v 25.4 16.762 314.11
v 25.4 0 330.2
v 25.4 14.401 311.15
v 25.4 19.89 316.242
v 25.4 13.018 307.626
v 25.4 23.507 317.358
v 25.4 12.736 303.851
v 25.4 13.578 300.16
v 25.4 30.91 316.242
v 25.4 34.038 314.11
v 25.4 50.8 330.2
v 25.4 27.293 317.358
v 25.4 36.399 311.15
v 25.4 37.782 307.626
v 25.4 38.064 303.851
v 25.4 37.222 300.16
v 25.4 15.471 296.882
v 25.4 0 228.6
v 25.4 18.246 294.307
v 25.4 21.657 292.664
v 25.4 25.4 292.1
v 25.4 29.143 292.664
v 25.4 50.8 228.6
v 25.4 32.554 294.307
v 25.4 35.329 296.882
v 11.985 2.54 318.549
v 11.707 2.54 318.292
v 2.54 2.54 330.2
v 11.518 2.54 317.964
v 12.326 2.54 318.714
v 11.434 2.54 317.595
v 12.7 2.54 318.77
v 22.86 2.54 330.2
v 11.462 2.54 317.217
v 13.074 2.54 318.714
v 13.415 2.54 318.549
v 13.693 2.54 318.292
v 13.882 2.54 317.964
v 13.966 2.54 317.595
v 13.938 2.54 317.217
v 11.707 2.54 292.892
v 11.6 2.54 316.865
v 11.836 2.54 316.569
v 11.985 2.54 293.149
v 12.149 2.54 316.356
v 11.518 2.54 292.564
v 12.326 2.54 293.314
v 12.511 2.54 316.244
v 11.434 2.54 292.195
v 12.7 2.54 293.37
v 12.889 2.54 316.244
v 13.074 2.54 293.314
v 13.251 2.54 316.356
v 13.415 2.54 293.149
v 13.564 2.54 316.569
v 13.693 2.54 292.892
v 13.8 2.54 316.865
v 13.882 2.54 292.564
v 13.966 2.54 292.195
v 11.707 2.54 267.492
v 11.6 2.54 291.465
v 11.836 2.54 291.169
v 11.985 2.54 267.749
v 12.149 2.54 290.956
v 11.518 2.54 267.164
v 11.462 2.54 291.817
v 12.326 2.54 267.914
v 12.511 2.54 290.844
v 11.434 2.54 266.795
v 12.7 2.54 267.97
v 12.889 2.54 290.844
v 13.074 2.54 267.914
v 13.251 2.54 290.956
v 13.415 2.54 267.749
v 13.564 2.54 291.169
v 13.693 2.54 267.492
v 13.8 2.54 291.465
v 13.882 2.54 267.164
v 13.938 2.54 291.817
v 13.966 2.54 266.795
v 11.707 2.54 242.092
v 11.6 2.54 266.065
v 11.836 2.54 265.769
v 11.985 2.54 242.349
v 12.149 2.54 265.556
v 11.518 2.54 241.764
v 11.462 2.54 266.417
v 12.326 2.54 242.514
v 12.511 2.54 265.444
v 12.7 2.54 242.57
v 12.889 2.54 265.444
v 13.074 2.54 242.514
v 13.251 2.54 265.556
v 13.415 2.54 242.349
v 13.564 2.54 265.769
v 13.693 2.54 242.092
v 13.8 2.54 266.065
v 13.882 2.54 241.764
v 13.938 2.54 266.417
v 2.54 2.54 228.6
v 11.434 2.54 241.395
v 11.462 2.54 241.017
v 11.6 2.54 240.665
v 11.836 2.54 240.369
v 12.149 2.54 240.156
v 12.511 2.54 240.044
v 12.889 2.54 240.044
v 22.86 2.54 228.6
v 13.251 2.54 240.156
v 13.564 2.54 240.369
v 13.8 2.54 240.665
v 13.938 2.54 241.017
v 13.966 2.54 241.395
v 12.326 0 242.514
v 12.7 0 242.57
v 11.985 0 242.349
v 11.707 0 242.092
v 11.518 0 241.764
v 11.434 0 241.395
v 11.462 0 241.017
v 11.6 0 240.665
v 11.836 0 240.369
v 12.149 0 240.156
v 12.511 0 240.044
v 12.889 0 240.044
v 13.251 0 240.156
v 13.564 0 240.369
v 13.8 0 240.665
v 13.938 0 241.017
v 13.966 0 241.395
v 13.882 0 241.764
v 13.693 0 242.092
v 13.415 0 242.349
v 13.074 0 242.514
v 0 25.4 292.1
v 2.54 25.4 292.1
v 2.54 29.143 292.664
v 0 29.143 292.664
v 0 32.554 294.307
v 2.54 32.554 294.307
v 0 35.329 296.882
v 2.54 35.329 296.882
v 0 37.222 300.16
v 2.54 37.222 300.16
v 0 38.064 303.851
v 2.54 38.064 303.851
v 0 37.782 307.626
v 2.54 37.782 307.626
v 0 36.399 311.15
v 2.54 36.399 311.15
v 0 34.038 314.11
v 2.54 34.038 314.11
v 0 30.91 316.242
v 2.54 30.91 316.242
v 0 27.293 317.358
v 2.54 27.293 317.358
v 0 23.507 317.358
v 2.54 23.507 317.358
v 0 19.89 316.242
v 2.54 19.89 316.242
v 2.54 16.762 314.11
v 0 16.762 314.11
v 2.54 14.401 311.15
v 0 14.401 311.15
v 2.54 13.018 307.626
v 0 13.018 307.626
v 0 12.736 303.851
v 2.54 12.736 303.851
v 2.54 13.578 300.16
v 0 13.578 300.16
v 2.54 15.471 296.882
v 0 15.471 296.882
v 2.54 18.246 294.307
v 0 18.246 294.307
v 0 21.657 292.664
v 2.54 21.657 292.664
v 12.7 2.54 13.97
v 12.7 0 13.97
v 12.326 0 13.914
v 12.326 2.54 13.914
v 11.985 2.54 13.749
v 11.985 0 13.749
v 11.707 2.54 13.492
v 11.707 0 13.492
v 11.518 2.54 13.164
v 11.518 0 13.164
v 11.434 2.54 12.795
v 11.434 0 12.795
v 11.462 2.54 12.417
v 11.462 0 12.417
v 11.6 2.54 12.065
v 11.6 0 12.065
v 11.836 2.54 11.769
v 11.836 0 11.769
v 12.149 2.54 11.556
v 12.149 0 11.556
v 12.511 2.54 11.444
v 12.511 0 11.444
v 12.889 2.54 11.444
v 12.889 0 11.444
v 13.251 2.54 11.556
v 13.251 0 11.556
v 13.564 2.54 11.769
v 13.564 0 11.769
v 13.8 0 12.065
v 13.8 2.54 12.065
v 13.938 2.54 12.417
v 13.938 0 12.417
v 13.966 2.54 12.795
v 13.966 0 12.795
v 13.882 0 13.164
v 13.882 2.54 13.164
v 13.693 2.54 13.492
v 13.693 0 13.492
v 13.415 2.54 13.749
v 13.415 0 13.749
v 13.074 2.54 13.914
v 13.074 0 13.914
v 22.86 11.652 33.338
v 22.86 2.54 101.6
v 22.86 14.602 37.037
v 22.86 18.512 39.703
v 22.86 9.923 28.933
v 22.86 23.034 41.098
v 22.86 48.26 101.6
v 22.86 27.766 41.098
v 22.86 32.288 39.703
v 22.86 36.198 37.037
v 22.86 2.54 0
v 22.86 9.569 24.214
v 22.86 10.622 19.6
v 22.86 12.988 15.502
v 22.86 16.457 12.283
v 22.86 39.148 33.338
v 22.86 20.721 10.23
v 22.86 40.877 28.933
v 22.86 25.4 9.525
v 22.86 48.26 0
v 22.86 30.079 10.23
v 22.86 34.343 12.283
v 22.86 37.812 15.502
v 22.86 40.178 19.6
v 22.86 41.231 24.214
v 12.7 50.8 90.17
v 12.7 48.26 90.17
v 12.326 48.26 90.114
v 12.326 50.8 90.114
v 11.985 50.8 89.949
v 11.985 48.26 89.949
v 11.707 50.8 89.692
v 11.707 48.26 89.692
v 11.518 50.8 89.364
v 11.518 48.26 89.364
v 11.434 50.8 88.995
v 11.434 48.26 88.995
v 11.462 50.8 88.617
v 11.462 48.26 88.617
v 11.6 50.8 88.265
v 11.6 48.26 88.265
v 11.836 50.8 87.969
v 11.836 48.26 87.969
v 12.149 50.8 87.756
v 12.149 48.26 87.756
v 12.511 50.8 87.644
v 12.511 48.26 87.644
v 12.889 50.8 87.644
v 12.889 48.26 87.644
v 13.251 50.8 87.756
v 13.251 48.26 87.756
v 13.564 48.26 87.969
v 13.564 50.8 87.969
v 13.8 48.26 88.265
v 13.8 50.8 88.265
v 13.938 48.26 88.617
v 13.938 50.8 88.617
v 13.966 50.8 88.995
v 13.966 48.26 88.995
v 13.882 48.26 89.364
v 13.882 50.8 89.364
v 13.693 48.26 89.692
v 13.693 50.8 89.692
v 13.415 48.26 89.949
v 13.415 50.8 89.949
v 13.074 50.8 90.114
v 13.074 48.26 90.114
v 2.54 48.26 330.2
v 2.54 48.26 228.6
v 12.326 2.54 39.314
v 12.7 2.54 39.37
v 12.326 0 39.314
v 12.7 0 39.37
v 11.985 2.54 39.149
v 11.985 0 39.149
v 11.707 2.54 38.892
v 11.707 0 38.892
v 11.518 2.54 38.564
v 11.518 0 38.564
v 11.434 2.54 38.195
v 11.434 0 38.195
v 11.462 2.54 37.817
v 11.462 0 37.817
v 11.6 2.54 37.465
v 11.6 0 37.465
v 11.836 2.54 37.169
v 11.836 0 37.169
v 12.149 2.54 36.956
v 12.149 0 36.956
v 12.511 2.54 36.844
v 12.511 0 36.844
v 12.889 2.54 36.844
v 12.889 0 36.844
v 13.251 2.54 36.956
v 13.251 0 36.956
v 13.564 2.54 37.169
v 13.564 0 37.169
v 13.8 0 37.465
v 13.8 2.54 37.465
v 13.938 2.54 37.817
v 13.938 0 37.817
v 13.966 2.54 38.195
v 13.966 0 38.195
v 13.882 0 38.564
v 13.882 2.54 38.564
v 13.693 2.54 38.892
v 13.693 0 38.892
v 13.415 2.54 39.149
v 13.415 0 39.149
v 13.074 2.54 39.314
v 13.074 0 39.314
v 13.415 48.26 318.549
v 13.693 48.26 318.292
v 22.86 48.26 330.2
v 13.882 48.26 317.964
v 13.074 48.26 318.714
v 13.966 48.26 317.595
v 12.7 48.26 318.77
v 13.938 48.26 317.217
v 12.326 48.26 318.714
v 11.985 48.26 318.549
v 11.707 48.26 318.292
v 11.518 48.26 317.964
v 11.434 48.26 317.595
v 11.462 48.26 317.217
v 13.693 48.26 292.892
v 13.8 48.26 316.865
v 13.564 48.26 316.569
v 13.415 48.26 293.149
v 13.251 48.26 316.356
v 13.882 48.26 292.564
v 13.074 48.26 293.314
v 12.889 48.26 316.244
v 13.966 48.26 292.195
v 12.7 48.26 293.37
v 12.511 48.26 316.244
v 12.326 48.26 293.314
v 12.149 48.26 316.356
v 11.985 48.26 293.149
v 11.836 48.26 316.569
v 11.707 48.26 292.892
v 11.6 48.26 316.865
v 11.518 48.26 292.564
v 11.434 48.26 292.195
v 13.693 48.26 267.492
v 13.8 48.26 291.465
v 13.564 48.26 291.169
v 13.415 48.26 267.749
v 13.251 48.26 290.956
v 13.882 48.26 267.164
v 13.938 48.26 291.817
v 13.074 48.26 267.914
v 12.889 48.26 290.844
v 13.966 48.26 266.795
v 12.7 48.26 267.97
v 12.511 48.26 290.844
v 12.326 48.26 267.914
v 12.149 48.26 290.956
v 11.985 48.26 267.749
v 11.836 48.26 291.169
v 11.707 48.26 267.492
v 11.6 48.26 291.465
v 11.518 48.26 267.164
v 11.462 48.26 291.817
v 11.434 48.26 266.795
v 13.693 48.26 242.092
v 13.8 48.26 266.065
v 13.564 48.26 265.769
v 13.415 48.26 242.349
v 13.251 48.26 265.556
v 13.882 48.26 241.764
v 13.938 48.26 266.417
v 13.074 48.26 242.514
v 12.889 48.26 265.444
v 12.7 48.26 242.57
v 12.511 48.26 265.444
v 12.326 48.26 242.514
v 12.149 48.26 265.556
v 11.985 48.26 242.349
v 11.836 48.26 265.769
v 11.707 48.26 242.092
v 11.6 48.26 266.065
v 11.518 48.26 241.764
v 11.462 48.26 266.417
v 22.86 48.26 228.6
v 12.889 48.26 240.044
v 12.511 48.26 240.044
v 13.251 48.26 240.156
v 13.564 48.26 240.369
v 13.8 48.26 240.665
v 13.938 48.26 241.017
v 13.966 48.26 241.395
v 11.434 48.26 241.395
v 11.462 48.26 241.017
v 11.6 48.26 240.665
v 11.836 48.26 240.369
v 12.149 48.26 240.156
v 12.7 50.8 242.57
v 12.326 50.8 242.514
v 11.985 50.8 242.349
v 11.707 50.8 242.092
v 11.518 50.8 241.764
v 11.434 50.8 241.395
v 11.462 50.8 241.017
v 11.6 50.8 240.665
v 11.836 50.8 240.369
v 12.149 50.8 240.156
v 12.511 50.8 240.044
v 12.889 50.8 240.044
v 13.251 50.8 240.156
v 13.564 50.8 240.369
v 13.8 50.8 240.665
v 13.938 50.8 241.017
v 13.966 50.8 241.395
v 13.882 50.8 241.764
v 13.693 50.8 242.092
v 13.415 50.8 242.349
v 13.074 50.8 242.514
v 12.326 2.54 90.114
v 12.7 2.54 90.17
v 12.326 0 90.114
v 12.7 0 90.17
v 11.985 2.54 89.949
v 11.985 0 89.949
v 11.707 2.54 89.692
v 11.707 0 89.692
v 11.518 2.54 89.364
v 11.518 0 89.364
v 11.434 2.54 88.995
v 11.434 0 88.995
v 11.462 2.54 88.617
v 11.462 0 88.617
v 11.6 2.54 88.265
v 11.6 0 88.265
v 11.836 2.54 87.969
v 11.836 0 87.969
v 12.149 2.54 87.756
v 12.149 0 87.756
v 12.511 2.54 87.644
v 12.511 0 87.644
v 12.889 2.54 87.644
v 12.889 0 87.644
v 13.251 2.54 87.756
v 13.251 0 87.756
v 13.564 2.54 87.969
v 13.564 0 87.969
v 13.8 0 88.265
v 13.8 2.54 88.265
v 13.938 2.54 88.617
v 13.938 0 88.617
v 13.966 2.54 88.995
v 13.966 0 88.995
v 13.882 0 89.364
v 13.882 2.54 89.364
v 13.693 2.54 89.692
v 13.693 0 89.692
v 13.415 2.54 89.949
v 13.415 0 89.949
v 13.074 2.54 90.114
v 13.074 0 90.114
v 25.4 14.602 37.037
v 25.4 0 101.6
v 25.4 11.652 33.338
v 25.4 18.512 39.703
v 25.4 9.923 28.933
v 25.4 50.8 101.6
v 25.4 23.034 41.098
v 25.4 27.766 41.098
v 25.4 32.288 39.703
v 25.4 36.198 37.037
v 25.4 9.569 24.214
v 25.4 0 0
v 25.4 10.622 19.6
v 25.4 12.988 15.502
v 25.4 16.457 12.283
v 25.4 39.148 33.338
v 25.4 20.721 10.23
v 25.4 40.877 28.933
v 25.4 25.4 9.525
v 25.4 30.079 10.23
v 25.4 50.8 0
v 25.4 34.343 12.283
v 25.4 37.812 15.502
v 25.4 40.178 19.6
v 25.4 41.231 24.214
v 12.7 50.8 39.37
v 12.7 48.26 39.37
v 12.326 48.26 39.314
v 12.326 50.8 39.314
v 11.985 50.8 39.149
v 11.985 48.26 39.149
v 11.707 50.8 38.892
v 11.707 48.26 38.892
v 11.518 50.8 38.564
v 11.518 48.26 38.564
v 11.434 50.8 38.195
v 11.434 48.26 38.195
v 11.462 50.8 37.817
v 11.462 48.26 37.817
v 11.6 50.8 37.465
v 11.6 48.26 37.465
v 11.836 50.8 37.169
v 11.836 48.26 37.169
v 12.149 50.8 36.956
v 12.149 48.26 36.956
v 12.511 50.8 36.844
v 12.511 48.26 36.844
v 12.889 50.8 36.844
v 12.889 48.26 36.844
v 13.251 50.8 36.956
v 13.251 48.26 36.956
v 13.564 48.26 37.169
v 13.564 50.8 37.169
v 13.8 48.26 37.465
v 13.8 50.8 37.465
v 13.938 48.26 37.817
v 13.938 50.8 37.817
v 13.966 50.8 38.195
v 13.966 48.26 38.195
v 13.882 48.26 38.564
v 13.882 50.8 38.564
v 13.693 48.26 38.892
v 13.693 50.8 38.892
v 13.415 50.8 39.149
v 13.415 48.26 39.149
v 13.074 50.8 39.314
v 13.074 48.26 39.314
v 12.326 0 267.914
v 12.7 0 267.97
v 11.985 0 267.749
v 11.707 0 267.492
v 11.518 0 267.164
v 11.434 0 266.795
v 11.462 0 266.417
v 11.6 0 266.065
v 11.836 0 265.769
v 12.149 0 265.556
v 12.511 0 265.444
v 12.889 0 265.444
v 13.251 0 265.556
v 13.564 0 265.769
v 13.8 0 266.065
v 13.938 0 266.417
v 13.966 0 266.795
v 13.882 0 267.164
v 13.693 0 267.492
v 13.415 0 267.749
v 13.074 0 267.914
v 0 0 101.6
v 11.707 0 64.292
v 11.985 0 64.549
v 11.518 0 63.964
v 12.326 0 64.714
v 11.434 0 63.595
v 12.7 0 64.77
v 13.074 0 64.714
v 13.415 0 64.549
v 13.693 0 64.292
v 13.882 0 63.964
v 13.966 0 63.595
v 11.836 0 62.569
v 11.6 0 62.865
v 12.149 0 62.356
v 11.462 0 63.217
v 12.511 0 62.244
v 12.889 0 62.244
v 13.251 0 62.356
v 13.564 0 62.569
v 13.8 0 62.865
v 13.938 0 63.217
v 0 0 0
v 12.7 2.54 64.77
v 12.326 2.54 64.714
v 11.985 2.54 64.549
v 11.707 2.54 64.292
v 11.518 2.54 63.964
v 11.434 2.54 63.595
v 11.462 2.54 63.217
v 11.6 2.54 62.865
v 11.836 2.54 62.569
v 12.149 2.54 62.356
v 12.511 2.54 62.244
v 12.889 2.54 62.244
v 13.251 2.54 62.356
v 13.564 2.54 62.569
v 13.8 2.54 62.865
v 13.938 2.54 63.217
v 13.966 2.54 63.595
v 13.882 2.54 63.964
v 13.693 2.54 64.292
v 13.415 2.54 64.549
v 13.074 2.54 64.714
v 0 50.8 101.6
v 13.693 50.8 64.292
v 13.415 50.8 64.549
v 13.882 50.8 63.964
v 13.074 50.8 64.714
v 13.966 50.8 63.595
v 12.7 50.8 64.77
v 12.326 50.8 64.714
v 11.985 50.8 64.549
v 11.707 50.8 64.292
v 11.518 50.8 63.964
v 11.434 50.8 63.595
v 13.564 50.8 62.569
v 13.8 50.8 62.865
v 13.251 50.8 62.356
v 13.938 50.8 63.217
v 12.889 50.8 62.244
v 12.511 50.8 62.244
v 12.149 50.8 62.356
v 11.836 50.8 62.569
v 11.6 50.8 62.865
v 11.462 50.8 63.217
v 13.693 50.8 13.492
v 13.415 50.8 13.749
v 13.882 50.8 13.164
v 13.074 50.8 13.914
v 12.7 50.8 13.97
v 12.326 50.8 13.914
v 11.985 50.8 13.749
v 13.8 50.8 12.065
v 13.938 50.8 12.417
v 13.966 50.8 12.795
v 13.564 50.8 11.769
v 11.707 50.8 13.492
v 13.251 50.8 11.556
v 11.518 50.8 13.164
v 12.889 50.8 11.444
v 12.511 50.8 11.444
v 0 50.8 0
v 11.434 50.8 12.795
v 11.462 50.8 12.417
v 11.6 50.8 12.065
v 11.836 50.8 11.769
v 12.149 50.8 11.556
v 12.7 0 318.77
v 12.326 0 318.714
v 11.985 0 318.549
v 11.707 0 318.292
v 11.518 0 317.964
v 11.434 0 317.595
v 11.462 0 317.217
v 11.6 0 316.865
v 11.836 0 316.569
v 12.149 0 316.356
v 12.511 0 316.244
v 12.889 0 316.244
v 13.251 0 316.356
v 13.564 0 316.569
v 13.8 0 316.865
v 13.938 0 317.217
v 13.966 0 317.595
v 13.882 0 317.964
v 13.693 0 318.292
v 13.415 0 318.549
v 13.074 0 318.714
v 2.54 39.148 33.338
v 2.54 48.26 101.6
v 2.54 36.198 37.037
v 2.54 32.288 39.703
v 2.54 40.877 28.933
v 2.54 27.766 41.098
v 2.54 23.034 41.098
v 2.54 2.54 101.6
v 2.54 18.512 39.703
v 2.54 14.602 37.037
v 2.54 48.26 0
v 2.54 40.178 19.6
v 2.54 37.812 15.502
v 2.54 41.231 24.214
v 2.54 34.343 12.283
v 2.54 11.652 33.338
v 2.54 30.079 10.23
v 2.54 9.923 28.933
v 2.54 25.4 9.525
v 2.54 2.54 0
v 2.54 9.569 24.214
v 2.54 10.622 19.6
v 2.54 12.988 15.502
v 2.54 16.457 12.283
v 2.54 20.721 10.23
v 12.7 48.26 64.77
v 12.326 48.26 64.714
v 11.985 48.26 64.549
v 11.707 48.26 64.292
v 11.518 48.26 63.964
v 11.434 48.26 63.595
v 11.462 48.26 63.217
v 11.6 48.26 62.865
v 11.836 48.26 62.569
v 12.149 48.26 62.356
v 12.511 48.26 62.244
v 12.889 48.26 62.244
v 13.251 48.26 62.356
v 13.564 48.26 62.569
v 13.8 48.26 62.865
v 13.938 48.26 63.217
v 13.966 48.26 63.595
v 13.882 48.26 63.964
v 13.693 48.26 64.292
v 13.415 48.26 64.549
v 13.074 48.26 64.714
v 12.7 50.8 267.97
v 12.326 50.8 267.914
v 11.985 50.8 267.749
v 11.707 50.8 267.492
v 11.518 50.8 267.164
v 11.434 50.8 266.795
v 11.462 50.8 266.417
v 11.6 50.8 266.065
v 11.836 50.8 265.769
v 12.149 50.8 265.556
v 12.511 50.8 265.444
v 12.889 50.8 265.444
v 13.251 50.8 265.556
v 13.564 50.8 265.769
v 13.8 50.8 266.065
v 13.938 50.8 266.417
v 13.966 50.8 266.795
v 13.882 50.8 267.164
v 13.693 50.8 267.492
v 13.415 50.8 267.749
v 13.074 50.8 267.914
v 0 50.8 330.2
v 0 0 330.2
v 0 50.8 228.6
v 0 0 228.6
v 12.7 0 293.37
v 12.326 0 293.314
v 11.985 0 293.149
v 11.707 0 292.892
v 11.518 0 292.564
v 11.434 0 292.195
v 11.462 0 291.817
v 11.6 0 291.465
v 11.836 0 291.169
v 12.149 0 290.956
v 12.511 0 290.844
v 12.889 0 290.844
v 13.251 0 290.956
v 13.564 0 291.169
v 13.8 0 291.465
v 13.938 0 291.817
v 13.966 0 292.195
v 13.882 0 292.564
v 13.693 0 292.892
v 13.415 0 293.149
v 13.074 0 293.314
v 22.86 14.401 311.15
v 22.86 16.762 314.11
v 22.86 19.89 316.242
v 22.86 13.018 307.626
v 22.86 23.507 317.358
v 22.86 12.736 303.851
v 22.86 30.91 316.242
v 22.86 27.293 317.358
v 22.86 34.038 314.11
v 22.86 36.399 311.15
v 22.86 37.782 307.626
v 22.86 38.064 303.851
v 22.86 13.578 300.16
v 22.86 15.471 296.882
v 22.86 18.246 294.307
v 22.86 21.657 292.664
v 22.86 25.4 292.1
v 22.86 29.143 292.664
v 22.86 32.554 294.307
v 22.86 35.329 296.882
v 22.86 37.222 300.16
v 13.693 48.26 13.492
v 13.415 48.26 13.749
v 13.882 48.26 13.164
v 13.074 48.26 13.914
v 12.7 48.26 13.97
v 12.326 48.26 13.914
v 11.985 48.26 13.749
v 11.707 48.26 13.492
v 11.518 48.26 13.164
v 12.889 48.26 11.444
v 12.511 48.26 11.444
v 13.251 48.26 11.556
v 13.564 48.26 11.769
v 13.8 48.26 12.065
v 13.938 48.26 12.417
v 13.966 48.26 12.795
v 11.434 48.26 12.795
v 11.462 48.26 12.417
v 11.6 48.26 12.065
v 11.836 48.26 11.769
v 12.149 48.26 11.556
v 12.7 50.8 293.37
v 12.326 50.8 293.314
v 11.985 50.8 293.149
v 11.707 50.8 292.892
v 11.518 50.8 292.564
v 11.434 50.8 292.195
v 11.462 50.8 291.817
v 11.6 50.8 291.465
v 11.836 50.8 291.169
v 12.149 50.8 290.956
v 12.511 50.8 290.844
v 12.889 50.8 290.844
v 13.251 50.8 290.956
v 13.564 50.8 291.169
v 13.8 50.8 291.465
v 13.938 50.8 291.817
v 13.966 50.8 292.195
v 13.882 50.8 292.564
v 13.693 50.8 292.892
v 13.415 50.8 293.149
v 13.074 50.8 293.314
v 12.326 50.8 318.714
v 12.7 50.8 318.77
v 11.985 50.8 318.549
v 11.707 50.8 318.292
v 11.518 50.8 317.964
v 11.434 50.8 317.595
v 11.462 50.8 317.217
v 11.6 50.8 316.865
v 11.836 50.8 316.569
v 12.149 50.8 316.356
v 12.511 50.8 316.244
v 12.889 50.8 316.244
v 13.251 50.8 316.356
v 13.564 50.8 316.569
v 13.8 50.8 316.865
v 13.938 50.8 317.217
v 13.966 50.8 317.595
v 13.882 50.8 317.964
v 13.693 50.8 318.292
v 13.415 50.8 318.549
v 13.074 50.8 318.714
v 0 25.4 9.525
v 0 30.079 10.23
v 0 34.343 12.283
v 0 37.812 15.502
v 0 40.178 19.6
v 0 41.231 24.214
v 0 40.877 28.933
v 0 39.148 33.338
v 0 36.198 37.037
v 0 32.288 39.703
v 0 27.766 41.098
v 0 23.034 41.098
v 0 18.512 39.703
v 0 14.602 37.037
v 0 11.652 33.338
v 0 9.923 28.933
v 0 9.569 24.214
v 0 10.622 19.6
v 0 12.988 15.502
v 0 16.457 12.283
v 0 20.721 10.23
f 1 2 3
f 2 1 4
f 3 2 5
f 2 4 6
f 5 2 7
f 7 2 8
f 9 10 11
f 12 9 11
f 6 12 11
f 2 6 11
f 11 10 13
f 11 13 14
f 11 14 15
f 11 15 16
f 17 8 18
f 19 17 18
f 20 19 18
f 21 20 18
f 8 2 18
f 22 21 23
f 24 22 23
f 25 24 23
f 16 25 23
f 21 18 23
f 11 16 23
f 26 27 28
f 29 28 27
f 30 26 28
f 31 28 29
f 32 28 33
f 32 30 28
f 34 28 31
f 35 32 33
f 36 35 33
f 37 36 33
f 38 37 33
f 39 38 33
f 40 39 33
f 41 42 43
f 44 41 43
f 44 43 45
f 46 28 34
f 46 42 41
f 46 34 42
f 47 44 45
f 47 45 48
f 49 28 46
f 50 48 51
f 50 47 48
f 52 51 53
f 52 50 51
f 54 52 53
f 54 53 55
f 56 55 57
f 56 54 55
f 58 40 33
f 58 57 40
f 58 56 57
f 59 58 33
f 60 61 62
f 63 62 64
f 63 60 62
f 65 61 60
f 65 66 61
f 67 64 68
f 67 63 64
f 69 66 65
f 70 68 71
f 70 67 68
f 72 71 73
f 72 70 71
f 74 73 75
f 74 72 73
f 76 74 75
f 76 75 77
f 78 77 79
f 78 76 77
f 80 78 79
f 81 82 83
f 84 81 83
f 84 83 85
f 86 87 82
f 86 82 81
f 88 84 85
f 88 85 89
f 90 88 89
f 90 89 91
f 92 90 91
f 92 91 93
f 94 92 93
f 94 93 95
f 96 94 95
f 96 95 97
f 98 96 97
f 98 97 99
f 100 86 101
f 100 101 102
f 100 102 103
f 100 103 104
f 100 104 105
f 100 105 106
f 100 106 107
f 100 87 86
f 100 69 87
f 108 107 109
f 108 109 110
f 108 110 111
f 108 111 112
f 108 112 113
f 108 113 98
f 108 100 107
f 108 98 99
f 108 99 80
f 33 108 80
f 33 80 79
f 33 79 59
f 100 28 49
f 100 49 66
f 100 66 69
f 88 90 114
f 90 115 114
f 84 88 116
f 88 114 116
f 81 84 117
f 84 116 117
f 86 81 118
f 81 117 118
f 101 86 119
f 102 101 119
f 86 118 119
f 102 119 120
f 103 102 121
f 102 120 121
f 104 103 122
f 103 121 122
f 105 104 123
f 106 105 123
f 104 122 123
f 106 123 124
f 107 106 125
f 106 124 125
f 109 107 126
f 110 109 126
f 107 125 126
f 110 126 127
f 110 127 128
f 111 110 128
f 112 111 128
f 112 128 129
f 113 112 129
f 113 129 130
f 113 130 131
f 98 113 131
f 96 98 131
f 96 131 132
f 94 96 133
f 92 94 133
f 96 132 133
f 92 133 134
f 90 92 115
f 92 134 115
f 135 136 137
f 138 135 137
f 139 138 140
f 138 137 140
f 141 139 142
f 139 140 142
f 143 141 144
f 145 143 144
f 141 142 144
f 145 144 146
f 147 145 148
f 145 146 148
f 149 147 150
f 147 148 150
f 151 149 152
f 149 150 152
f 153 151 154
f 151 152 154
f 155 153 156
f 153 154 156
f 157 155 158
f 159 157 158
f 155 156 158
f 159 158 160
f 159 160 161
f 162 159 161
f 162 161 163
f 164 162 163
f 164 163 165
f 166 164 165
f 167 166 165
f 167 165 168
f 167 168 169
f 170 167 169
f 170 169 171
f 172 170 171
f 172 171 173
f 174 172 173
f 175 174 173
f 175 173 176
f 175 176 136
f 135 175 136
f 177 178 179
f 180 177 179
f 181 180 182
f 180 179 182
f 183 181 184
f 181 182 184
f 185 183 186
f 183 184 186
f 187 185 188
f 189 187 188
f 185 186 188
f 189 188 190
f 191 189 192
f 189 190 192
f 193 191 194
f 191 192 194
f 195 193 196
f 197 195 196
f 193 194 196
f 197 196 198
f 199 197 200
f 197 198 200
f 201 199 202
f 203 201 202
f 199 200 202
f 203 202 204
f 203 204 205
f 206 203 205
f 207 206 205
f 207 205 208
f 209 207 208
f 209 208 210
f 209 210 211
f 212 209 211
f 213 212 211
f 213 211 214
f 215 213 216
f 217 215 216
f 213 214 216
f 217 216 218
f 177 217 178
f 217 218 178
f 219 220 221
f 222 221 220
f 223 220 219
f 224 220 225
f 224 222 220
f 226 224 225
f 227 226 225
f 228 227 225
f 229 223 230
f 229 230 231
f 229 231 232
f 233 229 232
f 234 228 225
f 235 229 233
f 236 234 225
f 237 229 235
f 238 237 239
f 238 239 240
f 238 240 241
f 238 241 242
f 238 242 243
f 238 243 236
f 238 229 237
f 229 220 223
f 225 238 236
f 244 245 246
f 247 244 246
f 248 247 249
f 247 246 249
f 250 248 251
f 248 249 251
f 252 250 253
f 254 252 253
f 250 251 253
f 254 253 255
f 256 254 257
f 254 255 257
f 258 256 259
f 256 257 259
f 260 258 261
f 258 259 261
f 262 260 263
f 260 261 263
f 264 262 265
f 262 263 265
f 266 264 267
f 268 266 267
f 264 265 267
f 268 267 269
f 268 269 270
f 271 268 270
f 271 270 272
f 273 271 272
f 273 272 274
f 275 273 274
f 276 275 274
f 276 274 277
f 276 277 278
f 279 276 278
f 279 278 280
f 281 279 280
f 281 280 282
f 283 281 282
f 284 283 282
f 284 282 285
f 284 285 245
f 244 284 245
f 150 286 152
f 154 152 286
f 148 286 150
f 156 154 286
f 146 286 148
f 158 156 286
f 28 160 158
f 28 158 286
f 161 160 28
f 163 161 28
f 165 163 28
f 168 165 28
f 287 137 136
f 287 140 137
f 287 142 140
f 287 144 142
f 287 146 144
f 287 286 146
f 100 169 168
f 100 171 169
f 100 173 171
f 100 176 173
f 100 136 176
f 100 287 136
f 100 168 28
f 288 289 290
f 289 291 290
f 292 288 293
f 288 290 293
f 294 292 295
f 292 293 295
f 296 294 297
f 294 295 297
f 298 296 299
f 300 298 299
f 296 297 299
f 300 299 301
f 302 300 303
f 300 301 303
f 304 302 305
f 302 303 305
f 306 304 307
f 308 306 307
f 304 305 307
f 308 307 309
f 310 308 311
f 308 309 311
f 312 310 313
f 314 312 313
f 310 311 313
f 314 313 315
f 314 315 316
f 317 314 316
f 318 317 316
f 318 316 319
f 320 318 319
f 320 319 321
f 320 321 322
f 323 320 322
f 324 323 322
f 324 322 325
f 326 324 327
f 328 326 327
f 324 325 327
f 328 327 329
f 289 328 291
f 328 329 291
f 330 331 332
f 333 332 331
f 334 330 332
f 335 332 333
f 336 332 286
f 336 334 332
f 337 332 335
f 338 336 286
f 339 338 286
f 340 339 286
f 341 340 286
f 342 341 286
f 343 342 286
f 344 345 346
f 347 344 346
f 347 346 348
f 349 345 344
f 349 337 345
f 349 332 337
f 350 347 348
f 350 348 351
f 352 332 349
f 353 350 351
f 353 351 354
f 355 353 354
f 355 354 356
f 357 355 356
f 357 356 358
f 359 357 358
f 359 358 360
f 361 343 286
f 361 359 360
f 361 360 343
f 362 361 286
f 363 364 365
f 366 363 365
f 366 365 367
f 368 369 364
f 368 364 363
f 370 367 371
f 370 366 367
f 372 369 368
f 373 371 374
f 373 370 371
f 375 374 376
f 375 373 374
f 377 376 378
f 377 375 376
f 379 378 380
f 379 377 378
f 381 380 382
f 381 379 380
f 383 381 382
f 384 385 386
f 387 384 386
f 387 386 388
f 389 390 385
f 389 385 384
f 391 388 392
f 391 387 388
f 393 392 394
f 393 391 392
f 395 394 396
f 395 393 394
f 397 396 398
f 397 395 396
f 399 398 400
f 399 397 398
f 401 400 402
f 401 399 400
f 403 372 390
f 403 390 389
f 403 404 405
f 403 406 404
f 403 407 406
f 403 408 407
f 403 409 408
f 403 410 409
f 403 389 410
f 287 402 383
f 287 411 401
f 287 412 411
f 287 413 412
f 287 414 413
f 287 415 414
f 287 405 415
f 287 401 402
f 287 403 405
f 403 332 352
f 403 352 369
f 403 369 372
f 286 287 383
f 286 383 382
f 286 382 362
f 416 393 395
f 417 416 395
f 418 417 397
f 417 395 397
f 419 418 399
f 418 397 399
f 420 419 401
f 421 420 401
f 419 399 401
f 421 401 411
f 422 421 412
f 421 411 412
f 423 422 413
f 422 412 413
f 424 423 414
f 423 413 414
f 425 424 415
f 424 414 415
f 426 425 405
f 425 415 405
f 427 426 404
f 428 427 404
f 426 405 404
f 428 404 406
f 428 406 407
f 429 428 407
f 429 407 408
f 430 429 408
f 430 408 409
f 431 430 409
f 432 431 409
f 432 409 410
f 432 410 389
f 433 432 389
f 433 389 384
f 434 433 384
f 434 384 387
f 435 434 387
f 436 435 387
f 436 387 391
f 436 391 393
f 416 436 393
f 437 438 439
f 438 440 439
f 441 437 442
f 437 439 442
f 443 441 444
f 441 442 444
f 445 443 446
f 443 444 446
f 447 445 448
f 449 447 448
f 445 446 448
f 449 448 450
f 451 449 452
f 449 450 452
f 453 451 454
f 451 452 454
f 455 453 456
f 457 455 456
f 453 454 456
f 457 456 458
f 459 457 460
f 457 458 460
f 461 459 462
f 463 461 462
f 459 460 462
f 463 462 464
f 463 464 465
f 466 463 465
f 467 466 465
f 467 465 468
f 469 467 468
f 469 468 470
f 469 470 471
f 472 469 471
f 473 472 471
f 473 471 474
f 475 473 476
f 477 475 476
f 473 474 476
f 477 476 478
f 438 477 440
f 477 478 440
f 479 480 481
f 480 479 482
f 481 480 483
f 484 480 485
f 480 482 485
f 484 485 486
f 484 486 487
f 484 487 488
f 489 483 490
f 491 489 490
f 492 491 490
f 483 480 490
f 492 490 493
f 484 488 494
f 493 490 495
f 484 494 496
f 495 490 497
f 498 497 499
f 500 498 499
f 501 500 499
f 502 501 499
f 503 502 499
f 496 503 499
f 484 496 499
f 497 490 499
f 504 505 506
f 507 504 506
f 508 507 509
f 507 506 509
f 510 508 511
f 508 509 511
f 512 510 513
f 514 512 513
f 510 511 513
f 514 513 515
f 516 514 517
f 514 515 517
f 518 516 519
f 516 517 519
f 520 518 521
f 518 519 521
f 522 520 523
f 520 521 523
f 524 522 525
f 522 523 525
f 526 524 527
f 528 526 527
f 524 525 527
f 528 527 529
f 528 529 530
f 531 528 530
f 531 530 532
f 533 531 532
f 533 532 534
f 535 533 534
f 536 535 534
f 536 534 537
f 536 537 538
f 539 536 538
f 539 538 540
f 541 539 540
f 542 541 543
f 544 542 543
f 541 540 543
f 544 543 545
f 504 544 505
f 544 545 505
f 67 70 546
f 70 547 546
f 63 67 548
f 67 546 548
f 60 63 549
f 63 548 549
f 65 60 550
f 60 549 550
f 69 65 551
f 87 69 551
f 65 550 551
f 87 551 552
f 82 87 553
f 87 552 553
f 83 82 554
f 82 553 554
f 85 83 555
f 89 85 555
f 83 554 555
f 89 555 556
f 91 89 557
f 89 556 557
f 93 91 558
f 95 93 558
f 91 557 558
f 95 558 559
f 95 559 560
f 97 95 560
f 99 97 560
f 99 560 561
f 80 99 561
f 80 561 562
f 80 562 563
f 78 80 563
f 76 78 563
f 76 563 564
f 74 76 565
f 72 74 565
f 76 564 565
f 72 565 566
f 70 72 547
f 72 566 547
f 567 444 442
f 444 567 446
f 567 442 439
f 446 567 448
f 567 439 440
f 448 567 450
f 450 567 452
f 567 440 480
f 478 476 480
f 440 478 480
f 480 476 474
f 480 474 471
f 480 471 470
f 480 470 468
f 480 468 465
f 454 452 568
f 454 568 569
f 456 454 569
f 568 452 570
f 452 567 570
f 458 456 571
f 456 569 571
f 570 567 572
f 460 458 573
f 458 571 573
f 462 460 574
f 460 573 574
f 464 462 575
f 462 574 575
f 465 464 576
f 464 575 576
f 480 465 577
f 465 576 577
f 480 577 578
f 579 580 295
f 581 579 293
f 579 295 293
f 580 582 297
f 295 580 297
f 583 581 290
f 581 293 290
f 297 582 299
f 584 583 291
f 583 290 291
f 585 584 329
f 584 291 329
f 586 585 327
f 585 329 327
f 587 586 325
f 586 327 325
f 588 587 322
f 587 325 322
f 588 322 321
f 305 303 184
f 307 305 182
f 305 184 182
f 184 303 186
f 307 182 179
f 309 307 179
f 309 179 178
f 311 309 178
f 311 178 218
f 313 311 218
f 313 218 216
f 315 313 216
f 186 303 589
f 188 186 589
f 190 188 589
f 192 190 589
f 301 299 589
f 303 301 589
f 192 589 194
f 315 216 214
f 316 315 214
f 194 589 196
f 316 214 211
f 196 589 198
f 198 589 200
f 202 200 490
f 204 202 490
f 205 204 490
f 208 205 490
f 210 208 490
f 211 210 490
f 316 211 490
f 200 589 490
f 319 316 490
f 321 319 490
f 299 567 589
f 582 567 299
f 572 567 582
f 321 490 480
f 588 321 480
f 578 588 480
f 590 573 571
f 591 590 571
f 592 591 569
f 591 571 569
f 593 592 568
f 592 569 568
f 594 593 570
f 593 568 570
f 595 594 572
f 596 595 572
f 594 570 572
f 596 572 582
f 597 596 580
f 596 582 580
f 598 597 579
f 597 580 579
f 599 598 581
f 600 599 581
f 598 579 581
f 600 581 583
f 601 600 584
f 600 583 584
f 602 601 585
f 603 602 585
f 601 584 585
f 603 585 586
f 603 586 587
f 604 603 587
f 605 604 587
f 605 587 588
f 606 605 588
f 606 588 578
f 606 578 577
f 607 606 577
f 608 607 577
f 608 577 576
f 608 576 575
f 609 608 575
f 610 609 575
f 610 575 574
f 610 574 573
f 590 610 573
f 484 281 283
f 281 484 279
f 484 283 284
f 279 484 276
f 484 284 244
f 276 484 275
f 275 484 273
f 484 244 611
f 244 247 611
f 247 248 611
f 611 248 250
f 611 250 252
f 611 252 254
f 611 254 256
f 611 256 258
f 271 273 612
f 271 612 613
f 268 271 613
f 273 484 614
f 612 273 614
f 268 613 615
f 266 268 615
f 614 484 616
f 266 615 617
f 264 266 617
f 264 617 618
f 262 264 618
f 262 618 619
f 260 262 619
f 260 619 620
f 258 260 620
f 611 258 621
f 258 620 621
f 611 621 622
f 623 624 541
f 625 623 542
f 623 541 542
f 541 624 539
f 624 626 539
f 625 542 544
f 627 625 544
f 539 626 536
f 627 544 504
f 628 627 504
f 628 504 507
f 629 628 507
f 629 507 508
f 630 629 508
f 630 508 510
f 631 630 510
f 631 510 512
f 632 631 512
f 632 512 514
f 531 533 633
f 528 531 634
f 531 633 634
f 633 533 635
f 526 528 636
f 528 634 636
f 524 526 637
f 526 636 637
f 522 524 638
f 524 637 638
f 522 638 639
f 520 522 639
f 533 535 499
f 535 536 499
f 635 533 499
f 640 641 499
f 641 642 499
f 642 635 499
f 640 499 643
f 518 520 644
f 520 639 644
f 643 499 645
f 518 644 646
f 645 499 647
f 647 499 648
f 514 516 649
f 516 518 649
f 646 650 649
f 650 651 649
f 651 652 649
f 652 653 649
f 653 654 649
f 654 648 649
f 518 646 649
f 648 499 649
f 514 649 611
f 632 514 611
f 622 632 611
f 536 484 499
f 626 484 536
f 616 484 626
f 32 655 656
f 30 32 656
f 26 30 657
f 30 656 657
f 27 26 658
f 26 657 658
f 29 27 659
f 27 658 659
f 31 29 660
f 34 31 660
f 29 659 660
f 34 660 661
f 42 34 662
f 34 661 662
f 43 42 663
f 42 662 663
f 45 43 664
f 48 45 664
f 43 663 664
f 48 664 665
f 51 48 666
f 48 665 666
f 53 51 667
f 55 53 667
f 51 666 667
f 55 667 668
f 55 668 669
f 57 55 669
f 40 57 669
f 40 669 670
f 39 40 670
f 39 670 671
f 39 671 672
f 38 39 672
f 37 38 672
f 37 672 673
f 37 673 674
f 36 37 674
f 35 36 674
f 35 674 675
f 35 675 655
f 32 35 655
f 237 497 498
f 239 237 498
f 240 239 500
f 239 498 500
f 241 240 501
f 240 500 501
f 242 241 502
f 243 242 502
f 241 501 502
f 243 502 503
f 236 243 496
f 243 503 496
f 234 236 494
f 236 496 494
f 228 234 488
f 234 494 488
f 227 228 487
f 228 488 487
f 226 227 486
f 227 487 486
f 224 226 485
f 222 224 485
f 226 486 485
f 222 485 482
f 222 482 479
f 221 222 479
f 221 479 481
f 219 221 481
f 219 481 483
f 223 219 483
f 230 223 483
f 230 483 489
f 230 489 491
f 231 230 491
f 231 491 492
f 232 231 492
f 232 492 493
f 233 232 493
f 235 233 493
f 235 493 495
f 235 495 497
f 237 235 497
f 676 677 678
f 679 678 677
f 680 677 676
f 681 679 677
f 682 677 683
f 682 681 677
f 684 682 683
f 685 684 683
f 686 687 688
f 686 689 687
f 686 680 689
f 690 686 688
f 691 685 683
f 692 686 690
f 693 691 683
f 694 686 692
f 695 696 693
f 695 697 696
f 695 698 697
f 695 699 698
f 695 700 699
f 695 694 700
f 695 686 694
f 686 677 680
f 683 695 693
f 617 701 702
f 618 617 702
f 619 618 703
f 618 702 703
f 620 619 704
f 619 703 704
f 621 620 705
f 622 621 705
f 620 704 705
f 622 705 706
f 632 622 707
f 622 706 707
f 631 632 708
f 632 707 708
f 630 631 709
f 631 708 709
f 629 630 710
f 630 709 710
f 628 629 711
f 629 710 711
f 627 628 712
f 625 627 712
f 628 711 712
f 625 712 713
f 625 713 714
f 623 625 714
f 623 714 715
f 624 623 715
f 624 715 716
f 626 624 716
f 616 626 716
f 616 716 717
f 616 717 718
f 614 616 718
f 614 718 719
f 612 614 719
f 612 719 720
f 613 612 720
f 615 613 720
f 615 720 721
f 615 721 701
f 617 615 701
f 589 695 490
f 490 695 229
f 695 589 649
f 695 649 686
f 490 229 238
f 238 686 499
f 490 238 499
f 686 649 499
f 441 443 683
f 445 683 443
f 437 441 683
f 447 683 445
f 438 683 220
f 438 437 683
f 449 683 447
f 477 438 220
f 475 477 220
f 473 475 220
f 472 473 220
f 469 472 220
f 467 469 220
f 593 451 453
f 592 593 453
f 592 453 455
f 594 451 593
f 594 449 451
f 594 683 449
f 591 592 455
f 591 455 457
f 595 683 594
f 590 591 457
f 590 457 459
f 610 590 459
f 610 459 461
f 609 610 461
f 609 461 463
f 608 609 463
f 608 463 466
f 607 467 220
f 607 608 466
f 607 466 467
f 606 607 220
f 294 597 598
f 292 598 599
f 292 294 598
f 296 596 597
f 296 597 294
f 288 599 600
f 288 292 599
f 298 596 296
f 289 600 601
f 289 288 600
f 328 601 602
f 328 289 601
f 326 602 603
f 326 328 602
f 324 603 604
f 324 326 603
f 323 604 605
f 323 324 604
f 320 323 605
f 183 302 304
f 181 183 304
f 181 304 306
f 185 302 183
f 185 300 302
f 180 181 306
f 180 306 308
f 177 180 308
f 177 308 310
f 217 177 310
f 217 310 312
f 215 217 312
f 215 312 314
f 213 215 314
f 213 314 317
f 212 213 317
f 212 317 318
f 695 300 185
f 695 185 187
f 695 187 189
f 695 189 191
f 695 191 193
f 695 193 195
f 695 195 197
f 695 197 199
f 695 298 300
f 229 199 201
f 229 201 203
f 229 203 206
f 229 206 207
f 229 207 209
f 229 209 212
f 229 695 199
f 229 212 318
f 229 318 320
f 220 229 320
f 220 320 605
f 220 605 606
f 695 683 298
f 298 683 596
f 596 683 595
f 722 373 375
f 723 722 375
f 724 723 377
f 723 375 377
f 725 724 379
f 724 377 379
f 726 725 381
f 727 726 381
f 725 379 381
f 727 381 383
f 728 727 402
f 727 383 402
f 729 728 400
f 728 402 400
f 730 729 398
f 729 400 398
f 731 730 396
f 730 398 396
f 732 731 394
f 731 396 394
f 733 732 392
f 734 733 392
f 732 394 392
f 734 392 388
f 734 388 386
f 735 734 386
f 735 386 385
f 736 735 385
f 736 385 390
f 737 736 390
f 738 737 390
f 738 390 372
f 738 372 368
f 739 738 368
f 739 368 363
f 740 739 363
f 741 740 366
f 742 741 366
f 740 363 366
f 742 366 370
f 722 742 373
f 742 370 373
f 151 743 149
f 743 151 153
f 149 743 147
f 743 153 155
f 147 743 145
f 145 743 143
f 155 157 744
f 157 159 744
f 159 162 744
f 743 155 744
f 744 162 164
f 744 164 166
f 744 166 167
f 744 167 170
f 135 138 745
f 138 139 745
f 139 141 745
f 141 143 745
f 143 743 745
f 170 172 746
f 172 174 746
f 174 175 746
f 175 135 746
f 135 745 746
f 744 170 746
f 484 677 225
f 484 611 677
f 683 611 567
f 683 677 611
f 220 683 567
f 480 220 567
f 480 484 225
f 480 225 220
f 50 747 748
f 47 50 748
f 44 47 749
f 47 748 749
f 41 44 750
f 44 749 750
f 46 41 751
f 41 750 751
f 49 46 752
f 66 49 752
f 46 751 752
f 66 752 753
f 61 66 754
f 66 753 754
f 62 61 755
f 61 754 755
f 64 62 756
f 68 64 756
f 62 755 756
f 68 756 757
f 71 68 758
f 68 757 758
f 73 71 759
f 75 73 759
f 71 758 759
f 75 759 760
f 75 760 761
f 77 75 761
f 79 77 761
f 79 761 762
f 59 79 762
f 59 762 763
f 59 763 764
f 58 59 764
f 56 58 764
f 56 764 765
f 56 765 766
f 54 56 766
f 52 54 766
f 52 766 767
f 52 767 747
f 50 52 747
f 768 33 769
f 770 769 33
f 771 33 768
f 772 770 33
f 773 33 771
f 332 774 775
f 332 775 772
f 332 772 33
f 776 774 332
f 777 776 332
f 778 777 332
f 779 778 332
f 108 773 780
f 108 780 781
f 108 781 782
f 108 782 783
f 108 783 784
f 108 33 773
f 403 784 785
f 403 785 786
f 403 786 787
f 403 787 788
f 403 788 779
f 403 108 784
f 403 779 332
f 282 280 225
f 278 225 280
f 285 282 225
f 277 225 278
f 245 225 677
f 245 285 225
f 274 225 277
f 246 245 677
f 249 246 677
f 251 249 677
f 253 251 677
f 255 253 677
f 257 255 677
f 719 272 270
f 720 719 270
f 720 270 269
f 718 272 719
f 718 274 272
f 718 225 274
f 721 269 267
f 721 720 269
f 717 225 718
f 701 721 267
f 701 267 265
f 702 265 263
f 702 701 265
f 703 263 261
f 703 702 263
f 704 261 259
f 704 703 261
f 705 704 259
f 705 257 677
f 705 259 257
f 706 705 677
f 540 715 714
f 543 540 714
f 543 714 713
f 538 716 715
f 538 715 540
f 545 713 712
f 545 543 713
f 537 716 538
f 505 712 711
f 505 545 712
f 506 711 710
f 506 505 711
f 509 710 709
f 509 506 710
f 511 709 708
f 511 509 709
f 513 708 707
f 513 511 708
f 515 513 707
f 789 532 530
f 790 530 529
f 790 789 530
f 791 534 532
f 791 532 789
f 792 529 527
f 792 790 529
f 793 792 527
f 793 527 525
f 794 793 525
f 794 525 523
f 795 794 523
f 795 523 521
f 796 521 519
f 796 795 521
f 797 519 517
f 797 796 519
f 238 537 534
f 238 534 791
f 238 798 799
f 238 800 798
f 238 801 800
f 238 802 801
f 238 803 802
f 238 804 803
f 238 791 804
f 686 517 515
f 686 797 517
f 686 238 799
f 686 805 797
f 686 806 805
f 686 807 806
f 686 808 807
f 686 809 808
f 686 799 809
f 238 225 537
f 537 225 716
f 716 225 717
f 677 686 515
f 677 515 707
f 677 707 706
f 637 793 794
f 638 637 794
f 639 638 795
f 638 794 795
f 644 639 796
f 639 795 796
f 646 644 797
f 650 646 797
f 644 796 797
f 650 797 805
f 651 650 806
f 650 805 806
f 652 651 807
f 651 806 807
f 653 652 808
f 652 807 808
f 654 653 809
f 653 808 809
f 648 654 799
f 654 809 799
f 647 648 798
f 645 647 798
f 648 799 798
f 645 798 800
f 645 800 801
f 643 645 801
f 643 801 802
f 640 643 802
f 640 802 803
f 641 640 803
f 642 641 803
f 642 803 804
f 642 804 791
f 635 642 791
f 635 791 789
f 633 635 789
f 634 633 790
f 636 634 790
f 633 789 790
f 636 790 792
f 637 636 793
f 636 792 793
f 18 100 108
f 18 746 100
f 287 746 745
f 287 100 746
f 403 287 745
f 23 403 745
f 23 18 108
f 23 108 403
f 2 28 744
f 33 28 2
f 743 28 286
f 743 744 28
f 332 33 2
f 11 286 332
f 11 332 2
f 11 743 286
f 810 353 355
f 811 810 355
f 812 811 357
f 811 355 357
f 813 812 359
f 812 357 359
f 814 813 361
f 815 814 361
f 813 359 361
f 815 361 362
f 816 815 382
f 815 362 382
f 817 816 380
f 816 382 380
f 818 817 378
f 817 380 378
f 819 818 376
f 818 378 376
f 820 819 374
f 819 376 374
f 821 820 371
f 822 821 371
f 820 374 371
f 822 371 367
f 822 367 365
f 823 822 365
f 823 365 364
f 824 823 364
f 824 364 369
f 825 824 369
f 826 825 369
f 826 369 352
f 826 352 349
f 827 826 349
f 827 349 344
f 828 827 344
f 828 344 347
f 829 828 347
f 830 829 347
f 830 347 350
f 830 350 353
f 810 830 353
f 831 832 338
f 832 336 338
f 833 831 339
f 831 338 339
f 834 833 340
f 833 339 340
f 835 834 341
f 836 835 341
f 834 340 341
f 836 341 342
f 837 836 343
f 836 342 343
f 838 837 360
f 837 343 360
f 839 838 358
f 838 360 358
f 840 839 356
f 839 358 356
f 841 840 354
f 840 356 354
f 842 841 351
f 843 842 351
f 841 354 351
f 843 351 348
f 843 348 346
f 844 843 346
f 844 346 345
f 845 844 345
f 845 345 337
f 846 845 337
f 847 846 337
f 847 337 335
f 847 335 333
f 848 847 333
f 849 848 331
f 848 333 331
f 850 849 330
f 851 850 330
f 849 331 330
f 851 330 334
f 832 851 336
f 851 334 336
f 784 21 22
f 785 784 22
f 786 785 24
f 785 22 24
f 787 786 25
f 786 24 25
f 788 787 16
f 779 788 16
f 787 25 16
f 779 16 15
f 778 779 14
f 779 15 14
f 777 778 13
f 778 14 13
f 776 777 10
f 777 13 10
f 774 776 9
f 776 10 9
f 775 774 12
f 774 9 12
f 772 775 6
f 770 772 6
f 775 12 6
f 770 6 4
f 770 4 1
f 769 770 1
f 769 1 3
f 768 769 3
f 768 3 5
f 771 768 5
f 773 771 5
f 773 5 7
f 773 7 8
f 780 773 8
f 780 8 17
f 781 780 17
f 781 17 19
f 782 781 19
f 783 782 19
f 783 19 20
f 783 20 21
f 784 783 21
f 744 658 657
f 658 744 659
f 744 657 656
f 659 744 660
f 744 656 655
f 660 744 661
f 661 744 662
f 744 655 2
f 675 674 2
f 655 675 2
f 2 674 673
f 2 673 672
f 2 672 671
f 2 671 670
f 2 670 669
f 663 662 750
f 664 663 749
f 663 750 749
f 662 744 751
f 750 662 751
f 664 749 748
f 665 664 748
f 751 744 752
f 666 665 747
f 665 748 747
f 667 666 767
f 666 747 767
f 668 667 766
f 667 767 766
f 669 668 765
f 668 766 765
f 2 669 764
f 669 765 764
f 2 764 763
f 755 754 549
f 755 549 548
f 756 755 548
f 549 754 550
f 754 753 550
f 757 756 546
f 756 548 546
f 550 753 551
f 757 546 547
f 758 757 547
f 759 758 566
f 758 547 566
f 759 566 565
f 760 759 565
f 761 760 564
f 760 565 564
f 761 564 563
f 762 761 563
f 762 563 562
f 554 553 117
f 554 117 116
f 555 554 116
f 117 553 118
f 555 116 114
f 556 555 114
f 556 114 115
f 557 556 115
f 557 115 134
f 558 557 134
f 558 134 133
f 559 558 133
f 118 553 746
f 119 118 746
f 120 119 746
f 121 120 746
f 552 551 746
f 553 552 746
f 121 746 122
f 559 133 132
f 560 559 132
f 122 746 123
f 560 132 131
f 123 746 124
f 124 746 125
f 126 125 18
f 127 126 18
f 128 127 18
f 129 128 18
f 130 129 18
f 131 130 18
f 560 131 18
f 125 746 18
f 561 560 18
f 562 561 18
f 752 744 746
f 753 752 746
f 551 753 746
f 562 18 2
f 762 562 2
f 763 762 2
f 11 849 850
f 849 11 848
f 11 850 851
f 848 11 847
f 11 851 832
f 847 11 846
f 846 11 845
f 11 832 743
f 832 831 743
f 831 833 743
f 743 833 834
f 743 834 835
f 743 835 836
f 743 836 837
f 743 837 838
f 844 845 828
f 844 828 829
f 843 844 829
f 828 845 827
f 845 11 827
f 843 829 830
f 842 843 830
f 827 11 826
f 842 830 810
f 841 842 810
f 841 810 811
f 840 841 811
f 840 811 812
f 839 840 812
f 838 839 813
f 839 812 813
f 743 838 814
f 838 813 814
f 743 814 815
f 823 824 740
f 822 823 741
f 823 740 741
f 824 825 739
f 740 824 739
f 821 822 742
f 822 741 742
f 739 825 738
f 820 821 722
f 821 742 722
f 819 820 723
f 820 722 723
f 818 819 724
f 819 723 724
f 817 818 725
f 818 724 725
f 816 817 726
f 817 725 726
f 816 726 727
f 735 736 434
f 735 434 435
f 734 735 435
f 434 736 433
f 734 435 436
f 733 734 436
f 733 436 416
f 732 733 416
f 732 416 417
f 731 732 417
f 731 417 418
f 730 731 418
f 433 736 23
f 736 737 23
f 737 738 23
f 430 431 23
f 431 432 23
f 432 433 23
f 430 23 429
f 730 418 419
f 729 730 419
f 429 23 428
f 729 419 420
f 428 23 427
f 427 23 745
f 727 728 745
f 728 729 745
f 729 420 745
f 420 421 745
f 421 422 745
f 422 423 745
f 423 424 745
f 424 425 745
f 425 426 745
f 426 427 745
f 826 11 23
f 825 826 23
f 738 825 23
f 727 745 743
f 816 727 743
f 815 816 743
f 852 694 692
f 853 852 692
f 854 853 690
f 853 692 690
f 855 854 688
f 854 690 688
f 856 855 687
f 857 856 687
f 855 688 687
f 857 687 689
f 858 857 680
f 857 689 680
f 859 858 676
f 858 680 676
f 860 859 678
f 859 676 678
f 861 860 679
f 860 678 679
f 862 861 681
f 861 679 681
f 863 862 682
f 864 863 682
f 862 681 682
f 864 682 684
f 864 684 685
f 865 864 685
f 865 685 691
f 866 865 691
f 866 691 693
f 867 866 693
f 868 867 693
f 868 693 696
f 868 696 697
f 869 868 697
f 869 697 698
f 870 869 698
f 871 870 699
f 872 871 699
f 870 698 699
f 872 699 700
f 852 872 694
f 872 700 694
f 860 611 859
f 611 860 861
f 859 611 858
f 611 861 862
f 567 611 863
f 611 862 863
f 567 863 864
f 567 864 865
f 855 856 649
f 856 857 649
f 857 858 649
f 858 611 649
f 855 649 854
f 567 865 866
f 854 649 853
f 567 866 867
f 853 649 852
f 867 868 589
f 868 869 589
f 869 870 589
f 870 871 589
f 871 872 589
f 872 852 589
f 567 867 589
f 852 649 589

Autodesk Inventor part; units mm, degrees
ref_plane "YZ Plane" through (0, 0, 0) normal (1, 0, 0) x (0, 1, 0)
ref_plane "XZ Plane" through (0, 0, 0) normal (0, 1, 0) x (-1, 0, 0)
ref_plane "XY Plane" through (0, 0, 0) normal (0, 0, 1) x (1, 0, 0)
sketch "Sketch1" plane through (0, 0, 0) normal (0, 0, 1) x (1, 0, 0)
  line L0 (0, 0) -> (25.4, 0)
  line L1 (25.4, 0) -> (25.4, 50.8)
  line L2 (25.4, 50.8) -> (0, 50.8)
  line L3 (0, 50.8) -> (0, 0)
  dimension "d0" = 25.4
  dimension "d1" = 50.8
extrude "Extrusion1" add sketch "Sketch1" along normal blind 330.2
shell "Shell1" thickness 2.54 removed faces 2 at (8.4667, 33.8667, 0) at (8.4667, 33.8667, 330.2)
sketch "Sketch2" plane through (0, 50.8, 0) normal (0, 1, 0) x (1, 0, 0)
  line L0 (25.4, 0) -> (0, 0) projected
  line L1 (0, 0) -> (0, -330.2) projected
  point P0 (12.7, -12.7)
  point P1 (12.7, -38.1)
  point P2 (12.7, -63.5)
  point P3 (12.7, -88.9)
  point P4 (12.7, -114.3)
  point P5 (12.7, -139.7)
  point P6 (12.7, -165.1)
  point P7 (12.7, -190.5)
  point P8 (12.7, -215.9)
  point P9 (12.7, -241.3)
  point P10 (12.7, -266.7)
  point P11 (12.7, -292.1)
  point P12 (12.7, -317.5)
  point P13 (12.7, -342.9)
  point P14 (12.7, -368.3)
  point P15 (12.7, -393.7)
  point P16 (12.7, -419.1)
  point P17 (12.7, -444.5)
  point P18 (12.7, -469.9)
  point P19 (12.7, -495.3)
  point P20 (12.7, -520.7)
  point P21 (12.7, -546.1)
  point P22 (12.7, -571.5)
  point P23 (12.7, -596.9)
  point P24 (12.7, -622.3)
  point P25 (12.7, -647.7)
  point P26 (12.7, -673.1)
  point P27 (12.7, -698.5)
  point P28 (12.7, -723.9)
  point P29 (12.7, -749.3)
  point P30 (12.7, -774.7)
  point P31 (12.7, -800.1)
  point P32 (12.7, -825.5)
  point P33 (12.7, -850.9)
  point P34 (12.7, -876.3)
  point P35 (12.7, -901.7)
  point P36 (12.7, -927.1)
  dimension "d5" = 12.7
  dimension "d6" = 12.7
  dimension "d9" = 25.4
hole "Hole1" at (12.7, 50.8, 12.7) at (12.7, 50.8, 38.1) at (12.7, 50.8, 63.5) at (12.7, 50.8, 88.9) at (12.7, 50.8, 114.3) at (12.7, 50.8, 139.7) at (12.7, 50.8, 165.1) at (12.7, 50.8, 190.5) at (12.7, 50.8, 215.9) at (12.7, 50.8, 241.3) at (12.7, 50.8, 266.7) at (12.7, 50.8, 292.1) at (12.7, 50.8, 317.5) at (12.7, 50.8, 342.9) at (12.7, 50.8, 368.3) at (12.7, 50.8, 393.7) at (12.7, 50.8, 419.1) at (12.7, 50.8, 444.5) at (12.7, 50.8, 469.9) at (12.7, 50.8, 495.3) at (12.7, 50.8, 520.7) at (12.7, 50.8, 546.1) at (12.7, 50.8, 571.5) at (12.7, 50.8, 596.9) at (12.7, 50.8, 622.3) at (12.7, 50.8, 647.7) at (12.7, 50.8, 673.1) at (12.7, 50.8, 698.5) at (12.7, 50.8, 723.9) at (12.7, 50.8, 749.3) at (12.7, 50.8, 774.7) at (12.7, 50.8, 800.1) at (12.7, 50.8, 825.5) at (12.7, 50.8, 850.9) at (12.7, 50.8, 876.3) at (12.7, 50.8, 901.7) direction (0, -1, 0) diameter 2.54 depth 50.8 tip angle 118
sketch "Sketch10" plane through (25.4, 0, 0) normal (1, 0, 0) x (0, 0, -1)
  line L0 (0, 50.8) -> (-330.2, 50.8) projected
  line L1 (0, 0) -> (0, 50.8) projected
  line L2 (-330.2, 0) -> (-330.2, 50.8) projected
  point P0 (-25.4, 25.4)
  point P1 (-304.8, 25.4)
  dimension "d66" = 25.4
  dimension "d67" = 25.4
  dimension "d68" = 279.4
  dimension "d69" = 25.4
  dimension "d70" = 25.4
hole "Hole5" at (25.4, 25.4, 25.4) at (25.4, 25.4, 304.8) direction (-1, 0, 0) diameter 12.7 depth 25.4 tip angle 118
sketch "Sketch11" plane through (25.4, 0, 0) normal (1, 0, 0) x (0, 0, -1)
  line L0 (0, 50.8) -> (-330.2, 50.8) projected
  line L1 (0, 0) -> (-330.2, 0) projected
  line L2 (-228.6, 50.8) -> (-101.6, 50.8)
  line L3 (-101.6, 50.8) -> (-101.6, 0)
  line L4 (-101.6, 0) -> (-228.6, 0)
  line L5 (-228.6, 0) -> (-228.6, 50.8)
  line L6 (0, 0) -> (0, 50.8) projected
  line L7 (-330.2, 0) -> (-330.2, 50.8) projected
  dimension "d78" = 101.6
  dimension "d79" = 101.6
extrude "Extrusion6" cut sketch "Sketch11" against normal blind 25.4 contours L3 L1 L5 L0
sketch "Sketch12" plane through (25.4, 0, 0) normal (1, 0, 0) x (0, 0, -1)
  circle A0 centre (-25.4, 25.4) radius 6.35 projected
  circle A1 centre (-25.4, 25.4) radius 6.35 projected
  circle A2 centre (-25.4, 25.4) radius 15.875
  circle A3 centre (-25.4, 25.4) radius 9.525
  line L0 (-35.3561, 30.0738) -> (-26.3304, 36.3591)
  line L1 (-26.3304, 36.3591) -> (-16.3743, 31.6853)
  line L2 (-16.3743, 31.6853) -> (-15.4439, 20.7262)
  line L3 (-15.4439, 20.7262) -> (-24.4696, 14.4409)
  line L4 (-24.4696, 14.4409) -> (-34.4257, 19.1147)
  line L5 (-34.4257, 19.1147) -> (-35.3561, 30.0738)
  point P0 (0, 0)
  dimension "d82" = 31.75
  dimension "d83" = 19.05
  dimension "d84" = 19.05
extrude "Extrusion7" cut sketch "Sketch12" against normal blind 25.4 contours A0 | A2 | A3 | A3 L2 L3 | A3 L1 L2 | L3 L4 A3 | A3 L0 L1 | L4 L5 A3 | A3 L5 L0
sketch "Sketch13" plane through (25.4, 0, 330.2) normal (1, 0, 0) x (0, 0, -1)
  line L0 (101.6, 50.8) -> (0, 50.8) projected
  line L1 (101.6, 0) -> (101.6, 50.8) projected
  line L2 (101.6, 50.8) -> (0, 50.8) projected
  line L3 (0, 0) -> (0, 50.8) projected
  line L4 (101.6, 0) -> (0, 0) projected
  circle A0 centre (25.4, 25.4) radius 6.35 projected
  circle A1 centre (25.4, 25.4) radius 12.7
  point P0 (330.2, 0)
  dimension "d87" = 25.4
extrude "Extrusion8" cut sketch "Sketch13" against normal blind 25.4 contours A1
sketch "Sketch14" plane through (25.4, 0, 330.2) normal (1, 0, 0) x (0, 0, -1)
  circle A0 centre (25.4, 25.4) radius 12.7 projected
  line L0 (0, 0) -> (0, 50.8) projected
  point P0 (330.2, 0)
  dimension "d90" = 25.4
equation "\"d69\" = d70"
properties part number "Support Pivs 252" material "Aluminum 6061"
